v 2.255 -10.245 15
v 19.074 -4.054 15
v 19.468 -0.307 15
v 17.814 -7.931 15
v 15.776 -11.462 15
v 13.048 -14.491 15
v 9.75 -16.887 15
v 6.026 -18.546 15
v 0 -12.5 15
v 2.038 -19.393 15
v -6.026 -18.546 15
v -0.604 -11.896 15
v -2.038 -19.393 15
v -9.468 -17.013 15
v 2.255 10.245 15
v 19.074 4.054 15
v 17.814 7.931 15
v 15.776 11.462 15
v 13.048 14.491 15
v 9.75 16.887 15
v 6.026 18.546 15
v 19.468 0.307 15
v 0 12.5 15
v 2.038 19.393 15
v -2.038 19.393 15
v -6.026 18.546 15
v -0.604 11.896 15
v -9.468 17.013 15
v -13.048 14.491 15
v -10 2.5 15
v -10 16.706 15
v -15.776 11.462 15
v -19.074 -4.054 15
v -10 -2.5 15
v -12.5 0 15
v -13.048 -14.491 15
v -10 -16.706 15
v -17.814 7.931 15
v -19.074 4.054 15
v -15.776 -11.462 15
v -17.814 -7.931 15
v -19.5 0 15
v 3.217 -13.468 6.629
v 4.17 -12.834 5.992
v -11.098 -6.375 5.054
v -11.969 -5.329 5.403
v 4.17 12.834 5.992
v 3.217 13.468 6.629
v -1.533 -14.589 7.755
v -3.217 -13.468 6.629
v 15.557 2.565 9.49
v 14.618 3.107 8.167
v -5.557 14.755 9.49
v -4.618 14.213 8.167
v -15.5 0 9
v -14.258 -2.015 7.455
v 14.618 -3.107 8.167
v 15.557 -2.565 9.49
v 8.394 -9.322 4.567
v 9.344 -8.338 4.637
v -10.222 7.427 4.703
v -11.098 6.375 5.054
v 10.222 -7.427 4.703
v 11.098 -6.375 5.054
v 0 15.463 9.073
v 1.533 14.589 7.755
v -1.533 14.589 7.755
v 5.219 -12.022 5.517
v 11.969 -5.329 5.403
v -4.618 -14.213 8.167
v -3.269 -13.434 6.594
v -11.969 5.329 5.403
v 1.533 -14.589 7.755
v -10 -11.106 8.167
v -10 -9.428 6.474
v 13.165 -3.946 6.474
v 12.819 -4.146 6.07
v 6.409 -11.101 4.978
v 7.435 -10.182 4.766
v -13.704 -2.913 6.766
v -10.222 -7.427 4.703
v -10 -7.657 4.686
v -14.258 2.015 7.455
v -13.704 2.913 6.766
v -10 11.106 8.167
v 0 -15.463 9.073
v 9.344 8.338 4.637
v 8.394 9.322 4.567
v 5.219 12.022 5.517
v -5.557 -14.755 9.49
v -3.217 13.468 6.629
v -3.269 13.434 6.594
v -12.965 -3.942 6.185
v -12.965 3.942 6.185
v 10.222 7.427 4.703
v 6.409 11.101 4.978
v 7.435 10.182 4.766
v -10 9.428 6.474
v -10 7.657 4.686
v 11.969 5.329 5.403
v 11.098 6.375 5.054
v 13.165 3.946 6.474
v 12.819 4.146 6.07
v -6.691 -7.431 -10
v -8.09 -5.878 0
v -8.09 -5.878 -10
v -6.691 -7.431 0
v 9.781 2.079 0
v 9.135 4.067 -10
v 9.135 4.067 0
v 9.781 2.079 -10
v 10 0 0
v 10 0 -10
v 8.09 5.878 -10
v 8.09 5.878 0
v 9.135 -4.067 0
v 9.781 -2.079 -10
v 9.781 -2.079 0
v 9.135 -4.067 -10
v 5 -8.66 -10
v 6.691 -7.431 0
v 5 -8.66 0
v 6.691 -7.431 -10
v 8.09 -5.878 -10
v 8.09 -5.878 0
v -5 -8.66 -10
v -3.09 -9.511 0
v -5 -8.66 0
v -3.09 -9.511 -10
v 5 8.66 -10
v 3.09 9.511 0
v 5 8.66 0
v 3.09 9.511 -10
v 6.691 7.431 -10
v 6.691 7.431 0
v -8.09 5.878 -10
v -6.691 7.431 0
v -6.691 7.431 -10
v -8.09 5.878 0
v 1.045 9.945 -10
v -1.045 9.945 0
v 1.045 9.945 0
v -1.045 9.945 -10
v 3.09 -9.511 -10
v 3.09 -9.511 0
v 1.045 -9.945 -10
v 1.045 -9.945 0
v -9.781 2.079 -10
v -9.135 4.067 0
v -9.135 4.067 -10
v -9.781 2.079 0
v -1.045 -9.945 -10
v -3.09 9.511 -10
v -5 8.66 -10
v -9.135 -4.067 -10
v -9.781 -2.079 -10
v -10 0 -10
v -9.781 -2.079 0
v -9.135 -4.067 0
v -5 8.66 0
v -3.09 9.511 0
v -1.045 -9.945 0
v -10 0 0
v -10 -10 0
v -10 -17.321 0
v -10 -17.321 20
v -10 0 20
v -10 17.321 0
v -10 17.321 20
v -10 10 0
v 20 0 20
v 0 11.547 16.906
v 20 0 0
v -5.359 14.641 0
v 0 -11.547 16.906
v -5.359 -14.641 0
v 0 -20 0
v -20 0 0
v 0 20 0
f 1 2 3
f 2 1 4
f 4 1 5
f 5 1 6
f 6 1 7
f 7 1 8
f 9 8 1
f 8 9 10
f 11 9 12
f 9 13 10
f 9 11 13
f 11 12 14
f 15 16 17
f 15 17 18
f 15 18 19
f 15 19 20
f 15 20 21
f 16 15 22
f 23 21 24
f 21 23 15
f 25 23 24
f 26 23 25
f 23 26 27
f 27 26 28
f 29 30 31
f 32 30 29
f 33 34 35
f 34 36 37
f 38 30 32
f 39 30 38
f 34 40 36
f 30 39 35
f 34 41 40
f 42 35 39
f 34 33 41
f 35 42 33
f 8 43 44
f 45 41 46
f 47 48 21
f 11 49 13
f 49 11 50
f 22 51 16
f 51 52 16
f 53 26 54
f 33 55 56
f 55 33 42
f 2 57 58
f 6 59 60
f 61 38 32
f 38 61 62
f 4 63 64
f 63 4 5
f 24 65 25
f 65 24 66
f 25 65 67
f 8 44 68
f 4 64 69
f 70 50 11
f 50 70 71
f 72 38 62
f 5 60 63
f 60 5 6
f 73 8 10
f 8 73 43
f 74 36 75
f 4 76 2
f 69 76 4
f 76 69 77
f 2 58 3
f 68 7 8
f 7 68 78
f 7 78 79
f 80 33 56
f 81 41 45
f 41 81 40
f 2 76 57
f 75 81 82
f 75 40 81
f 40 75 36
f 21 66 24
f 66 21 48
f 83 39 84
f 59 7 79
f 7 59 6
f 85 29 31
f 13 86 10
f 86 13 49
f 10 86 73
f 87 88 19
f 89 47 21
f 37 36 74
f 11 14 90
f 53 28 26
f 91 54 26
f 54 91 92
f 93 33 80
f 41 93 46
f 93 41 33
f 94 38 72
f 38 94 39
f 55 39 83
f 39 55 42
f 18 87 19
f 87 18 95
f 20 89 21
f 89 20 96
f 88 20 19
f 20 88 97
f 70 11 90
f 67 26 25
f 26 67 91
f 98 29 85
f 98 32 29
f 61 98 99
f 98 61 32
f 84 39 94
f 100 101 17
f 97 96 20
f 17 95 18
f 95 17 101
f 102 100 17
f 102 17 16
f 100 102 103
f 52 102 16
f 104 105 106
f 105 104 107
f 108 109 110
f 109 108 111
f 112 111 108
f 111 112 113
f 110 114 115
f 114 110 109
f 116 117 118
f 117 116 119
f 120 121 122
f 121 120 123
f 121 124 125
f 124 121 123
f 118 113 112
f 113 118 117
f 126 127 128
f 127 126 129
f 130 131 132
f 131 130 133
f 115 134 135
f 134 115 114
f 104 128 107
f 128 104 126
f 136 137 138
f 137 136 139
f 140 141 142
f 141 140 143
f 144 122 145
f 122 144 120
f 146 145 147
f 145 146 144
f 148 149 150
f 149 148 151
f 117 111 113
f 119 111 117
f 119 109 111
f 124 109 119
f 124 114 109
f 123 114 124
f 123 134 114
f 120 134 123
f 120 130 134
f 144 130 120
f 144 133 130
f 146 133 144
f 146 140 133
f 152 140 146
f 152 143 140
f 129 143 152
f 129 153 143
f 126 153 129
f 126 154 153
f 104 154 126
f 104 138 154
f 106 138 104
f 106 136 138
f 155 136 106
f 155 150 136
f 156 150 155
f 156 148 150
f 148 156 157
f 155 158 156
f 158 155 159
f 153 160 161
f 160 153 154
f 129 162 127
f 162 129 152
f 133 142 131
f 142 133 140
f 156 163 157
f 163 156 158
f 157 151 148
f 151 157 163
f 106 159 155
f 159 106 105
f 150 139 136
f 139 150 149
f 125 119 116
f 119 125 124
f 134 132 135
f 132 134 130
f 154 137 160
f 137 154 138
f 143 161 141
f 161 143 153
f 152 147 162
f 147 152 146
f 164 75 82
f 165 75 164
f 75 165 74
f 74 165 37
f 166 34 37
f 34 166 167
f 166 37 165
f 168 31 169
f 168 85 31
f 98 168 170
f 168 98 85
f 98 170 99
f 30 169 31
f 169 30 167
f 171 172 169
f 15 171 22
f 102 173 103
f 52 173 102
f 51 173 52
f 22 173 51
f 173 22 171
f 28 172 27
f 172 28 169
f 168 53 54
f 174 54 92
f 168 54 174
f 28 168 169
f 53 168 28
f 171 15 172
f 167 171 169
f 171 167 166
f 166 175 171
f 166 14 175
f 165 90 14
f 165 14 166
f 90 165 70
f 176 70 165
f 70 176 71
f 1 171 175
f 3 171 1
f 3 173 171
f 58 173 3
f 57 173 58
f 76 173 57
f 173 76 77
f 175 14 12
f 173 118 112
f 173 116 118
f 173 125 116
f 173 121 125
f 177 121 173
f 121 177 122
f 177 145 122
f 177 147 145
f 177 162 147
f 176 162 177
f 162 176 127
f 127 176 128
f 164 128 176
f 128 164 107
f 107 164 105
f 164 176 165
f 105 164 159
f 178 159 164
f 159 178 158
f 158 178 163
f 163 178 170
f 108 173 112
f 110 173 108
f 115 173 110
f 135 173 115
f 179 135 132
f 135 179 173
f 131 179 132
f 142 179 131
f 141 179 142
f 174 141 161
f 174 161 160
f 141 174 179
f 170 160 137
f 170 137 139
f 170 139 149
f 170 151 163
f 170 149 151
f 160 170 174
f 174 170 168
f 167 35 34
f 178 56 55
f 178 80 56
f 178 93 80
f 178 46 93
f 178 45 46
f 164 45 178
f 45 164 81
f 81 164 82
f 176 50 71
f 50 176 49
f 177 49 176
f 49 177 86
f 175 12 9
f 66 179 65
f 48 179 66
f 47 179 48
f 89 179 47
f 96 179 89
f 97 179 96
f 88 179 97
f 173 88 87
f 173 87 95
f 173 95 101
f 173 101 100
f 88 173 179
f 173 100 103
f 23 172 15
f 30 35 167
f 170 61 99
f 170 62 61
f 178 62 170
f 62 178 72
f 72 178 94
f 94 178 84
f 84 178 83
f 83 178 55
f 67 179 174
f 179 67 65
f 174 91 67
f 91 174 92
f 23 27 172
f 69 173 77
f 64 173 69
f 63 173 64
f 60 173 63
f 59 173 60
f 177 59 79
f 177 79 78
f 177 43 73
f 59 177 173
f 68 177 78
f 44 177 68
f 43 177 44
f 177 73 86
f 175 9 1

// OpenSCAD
 cylinder(h=15, r=9.5, center=false);

 cylinder(h=15, r1=9.5, r2=19.5, center=false);
 cylinder(  15,    9.5,    19.5, false);
 cylinder(  15,    9.5,    19.5);
 cylinder(  15,    9.5, d2=39  );
 cylinder(  15, d1=19,  d2=39  );
 cylinder(  15, d1=19,  r2=19.5);

  cylinder(h=15, r1=10, r2=0, center=true);
 cylinder(  15,    10,    0,        true);
 cylinder(h=15, d1=20, d2=0, center=true);

  cylinder(h=20, r=10, center=true);
 cylinder(  20,   10, 10,true);
 cylinder(  20, d=20, center=true);
 cylinder(  20,r1=10, d2=20, center=true);
 cylinder(  20,r1=10, d2=2*10, center=true);

  cylinder(20,20,20,$fn=3);
 cylinder(20,20,00,$fn=4);
 cylinder(20,20,10,$fn=4);
